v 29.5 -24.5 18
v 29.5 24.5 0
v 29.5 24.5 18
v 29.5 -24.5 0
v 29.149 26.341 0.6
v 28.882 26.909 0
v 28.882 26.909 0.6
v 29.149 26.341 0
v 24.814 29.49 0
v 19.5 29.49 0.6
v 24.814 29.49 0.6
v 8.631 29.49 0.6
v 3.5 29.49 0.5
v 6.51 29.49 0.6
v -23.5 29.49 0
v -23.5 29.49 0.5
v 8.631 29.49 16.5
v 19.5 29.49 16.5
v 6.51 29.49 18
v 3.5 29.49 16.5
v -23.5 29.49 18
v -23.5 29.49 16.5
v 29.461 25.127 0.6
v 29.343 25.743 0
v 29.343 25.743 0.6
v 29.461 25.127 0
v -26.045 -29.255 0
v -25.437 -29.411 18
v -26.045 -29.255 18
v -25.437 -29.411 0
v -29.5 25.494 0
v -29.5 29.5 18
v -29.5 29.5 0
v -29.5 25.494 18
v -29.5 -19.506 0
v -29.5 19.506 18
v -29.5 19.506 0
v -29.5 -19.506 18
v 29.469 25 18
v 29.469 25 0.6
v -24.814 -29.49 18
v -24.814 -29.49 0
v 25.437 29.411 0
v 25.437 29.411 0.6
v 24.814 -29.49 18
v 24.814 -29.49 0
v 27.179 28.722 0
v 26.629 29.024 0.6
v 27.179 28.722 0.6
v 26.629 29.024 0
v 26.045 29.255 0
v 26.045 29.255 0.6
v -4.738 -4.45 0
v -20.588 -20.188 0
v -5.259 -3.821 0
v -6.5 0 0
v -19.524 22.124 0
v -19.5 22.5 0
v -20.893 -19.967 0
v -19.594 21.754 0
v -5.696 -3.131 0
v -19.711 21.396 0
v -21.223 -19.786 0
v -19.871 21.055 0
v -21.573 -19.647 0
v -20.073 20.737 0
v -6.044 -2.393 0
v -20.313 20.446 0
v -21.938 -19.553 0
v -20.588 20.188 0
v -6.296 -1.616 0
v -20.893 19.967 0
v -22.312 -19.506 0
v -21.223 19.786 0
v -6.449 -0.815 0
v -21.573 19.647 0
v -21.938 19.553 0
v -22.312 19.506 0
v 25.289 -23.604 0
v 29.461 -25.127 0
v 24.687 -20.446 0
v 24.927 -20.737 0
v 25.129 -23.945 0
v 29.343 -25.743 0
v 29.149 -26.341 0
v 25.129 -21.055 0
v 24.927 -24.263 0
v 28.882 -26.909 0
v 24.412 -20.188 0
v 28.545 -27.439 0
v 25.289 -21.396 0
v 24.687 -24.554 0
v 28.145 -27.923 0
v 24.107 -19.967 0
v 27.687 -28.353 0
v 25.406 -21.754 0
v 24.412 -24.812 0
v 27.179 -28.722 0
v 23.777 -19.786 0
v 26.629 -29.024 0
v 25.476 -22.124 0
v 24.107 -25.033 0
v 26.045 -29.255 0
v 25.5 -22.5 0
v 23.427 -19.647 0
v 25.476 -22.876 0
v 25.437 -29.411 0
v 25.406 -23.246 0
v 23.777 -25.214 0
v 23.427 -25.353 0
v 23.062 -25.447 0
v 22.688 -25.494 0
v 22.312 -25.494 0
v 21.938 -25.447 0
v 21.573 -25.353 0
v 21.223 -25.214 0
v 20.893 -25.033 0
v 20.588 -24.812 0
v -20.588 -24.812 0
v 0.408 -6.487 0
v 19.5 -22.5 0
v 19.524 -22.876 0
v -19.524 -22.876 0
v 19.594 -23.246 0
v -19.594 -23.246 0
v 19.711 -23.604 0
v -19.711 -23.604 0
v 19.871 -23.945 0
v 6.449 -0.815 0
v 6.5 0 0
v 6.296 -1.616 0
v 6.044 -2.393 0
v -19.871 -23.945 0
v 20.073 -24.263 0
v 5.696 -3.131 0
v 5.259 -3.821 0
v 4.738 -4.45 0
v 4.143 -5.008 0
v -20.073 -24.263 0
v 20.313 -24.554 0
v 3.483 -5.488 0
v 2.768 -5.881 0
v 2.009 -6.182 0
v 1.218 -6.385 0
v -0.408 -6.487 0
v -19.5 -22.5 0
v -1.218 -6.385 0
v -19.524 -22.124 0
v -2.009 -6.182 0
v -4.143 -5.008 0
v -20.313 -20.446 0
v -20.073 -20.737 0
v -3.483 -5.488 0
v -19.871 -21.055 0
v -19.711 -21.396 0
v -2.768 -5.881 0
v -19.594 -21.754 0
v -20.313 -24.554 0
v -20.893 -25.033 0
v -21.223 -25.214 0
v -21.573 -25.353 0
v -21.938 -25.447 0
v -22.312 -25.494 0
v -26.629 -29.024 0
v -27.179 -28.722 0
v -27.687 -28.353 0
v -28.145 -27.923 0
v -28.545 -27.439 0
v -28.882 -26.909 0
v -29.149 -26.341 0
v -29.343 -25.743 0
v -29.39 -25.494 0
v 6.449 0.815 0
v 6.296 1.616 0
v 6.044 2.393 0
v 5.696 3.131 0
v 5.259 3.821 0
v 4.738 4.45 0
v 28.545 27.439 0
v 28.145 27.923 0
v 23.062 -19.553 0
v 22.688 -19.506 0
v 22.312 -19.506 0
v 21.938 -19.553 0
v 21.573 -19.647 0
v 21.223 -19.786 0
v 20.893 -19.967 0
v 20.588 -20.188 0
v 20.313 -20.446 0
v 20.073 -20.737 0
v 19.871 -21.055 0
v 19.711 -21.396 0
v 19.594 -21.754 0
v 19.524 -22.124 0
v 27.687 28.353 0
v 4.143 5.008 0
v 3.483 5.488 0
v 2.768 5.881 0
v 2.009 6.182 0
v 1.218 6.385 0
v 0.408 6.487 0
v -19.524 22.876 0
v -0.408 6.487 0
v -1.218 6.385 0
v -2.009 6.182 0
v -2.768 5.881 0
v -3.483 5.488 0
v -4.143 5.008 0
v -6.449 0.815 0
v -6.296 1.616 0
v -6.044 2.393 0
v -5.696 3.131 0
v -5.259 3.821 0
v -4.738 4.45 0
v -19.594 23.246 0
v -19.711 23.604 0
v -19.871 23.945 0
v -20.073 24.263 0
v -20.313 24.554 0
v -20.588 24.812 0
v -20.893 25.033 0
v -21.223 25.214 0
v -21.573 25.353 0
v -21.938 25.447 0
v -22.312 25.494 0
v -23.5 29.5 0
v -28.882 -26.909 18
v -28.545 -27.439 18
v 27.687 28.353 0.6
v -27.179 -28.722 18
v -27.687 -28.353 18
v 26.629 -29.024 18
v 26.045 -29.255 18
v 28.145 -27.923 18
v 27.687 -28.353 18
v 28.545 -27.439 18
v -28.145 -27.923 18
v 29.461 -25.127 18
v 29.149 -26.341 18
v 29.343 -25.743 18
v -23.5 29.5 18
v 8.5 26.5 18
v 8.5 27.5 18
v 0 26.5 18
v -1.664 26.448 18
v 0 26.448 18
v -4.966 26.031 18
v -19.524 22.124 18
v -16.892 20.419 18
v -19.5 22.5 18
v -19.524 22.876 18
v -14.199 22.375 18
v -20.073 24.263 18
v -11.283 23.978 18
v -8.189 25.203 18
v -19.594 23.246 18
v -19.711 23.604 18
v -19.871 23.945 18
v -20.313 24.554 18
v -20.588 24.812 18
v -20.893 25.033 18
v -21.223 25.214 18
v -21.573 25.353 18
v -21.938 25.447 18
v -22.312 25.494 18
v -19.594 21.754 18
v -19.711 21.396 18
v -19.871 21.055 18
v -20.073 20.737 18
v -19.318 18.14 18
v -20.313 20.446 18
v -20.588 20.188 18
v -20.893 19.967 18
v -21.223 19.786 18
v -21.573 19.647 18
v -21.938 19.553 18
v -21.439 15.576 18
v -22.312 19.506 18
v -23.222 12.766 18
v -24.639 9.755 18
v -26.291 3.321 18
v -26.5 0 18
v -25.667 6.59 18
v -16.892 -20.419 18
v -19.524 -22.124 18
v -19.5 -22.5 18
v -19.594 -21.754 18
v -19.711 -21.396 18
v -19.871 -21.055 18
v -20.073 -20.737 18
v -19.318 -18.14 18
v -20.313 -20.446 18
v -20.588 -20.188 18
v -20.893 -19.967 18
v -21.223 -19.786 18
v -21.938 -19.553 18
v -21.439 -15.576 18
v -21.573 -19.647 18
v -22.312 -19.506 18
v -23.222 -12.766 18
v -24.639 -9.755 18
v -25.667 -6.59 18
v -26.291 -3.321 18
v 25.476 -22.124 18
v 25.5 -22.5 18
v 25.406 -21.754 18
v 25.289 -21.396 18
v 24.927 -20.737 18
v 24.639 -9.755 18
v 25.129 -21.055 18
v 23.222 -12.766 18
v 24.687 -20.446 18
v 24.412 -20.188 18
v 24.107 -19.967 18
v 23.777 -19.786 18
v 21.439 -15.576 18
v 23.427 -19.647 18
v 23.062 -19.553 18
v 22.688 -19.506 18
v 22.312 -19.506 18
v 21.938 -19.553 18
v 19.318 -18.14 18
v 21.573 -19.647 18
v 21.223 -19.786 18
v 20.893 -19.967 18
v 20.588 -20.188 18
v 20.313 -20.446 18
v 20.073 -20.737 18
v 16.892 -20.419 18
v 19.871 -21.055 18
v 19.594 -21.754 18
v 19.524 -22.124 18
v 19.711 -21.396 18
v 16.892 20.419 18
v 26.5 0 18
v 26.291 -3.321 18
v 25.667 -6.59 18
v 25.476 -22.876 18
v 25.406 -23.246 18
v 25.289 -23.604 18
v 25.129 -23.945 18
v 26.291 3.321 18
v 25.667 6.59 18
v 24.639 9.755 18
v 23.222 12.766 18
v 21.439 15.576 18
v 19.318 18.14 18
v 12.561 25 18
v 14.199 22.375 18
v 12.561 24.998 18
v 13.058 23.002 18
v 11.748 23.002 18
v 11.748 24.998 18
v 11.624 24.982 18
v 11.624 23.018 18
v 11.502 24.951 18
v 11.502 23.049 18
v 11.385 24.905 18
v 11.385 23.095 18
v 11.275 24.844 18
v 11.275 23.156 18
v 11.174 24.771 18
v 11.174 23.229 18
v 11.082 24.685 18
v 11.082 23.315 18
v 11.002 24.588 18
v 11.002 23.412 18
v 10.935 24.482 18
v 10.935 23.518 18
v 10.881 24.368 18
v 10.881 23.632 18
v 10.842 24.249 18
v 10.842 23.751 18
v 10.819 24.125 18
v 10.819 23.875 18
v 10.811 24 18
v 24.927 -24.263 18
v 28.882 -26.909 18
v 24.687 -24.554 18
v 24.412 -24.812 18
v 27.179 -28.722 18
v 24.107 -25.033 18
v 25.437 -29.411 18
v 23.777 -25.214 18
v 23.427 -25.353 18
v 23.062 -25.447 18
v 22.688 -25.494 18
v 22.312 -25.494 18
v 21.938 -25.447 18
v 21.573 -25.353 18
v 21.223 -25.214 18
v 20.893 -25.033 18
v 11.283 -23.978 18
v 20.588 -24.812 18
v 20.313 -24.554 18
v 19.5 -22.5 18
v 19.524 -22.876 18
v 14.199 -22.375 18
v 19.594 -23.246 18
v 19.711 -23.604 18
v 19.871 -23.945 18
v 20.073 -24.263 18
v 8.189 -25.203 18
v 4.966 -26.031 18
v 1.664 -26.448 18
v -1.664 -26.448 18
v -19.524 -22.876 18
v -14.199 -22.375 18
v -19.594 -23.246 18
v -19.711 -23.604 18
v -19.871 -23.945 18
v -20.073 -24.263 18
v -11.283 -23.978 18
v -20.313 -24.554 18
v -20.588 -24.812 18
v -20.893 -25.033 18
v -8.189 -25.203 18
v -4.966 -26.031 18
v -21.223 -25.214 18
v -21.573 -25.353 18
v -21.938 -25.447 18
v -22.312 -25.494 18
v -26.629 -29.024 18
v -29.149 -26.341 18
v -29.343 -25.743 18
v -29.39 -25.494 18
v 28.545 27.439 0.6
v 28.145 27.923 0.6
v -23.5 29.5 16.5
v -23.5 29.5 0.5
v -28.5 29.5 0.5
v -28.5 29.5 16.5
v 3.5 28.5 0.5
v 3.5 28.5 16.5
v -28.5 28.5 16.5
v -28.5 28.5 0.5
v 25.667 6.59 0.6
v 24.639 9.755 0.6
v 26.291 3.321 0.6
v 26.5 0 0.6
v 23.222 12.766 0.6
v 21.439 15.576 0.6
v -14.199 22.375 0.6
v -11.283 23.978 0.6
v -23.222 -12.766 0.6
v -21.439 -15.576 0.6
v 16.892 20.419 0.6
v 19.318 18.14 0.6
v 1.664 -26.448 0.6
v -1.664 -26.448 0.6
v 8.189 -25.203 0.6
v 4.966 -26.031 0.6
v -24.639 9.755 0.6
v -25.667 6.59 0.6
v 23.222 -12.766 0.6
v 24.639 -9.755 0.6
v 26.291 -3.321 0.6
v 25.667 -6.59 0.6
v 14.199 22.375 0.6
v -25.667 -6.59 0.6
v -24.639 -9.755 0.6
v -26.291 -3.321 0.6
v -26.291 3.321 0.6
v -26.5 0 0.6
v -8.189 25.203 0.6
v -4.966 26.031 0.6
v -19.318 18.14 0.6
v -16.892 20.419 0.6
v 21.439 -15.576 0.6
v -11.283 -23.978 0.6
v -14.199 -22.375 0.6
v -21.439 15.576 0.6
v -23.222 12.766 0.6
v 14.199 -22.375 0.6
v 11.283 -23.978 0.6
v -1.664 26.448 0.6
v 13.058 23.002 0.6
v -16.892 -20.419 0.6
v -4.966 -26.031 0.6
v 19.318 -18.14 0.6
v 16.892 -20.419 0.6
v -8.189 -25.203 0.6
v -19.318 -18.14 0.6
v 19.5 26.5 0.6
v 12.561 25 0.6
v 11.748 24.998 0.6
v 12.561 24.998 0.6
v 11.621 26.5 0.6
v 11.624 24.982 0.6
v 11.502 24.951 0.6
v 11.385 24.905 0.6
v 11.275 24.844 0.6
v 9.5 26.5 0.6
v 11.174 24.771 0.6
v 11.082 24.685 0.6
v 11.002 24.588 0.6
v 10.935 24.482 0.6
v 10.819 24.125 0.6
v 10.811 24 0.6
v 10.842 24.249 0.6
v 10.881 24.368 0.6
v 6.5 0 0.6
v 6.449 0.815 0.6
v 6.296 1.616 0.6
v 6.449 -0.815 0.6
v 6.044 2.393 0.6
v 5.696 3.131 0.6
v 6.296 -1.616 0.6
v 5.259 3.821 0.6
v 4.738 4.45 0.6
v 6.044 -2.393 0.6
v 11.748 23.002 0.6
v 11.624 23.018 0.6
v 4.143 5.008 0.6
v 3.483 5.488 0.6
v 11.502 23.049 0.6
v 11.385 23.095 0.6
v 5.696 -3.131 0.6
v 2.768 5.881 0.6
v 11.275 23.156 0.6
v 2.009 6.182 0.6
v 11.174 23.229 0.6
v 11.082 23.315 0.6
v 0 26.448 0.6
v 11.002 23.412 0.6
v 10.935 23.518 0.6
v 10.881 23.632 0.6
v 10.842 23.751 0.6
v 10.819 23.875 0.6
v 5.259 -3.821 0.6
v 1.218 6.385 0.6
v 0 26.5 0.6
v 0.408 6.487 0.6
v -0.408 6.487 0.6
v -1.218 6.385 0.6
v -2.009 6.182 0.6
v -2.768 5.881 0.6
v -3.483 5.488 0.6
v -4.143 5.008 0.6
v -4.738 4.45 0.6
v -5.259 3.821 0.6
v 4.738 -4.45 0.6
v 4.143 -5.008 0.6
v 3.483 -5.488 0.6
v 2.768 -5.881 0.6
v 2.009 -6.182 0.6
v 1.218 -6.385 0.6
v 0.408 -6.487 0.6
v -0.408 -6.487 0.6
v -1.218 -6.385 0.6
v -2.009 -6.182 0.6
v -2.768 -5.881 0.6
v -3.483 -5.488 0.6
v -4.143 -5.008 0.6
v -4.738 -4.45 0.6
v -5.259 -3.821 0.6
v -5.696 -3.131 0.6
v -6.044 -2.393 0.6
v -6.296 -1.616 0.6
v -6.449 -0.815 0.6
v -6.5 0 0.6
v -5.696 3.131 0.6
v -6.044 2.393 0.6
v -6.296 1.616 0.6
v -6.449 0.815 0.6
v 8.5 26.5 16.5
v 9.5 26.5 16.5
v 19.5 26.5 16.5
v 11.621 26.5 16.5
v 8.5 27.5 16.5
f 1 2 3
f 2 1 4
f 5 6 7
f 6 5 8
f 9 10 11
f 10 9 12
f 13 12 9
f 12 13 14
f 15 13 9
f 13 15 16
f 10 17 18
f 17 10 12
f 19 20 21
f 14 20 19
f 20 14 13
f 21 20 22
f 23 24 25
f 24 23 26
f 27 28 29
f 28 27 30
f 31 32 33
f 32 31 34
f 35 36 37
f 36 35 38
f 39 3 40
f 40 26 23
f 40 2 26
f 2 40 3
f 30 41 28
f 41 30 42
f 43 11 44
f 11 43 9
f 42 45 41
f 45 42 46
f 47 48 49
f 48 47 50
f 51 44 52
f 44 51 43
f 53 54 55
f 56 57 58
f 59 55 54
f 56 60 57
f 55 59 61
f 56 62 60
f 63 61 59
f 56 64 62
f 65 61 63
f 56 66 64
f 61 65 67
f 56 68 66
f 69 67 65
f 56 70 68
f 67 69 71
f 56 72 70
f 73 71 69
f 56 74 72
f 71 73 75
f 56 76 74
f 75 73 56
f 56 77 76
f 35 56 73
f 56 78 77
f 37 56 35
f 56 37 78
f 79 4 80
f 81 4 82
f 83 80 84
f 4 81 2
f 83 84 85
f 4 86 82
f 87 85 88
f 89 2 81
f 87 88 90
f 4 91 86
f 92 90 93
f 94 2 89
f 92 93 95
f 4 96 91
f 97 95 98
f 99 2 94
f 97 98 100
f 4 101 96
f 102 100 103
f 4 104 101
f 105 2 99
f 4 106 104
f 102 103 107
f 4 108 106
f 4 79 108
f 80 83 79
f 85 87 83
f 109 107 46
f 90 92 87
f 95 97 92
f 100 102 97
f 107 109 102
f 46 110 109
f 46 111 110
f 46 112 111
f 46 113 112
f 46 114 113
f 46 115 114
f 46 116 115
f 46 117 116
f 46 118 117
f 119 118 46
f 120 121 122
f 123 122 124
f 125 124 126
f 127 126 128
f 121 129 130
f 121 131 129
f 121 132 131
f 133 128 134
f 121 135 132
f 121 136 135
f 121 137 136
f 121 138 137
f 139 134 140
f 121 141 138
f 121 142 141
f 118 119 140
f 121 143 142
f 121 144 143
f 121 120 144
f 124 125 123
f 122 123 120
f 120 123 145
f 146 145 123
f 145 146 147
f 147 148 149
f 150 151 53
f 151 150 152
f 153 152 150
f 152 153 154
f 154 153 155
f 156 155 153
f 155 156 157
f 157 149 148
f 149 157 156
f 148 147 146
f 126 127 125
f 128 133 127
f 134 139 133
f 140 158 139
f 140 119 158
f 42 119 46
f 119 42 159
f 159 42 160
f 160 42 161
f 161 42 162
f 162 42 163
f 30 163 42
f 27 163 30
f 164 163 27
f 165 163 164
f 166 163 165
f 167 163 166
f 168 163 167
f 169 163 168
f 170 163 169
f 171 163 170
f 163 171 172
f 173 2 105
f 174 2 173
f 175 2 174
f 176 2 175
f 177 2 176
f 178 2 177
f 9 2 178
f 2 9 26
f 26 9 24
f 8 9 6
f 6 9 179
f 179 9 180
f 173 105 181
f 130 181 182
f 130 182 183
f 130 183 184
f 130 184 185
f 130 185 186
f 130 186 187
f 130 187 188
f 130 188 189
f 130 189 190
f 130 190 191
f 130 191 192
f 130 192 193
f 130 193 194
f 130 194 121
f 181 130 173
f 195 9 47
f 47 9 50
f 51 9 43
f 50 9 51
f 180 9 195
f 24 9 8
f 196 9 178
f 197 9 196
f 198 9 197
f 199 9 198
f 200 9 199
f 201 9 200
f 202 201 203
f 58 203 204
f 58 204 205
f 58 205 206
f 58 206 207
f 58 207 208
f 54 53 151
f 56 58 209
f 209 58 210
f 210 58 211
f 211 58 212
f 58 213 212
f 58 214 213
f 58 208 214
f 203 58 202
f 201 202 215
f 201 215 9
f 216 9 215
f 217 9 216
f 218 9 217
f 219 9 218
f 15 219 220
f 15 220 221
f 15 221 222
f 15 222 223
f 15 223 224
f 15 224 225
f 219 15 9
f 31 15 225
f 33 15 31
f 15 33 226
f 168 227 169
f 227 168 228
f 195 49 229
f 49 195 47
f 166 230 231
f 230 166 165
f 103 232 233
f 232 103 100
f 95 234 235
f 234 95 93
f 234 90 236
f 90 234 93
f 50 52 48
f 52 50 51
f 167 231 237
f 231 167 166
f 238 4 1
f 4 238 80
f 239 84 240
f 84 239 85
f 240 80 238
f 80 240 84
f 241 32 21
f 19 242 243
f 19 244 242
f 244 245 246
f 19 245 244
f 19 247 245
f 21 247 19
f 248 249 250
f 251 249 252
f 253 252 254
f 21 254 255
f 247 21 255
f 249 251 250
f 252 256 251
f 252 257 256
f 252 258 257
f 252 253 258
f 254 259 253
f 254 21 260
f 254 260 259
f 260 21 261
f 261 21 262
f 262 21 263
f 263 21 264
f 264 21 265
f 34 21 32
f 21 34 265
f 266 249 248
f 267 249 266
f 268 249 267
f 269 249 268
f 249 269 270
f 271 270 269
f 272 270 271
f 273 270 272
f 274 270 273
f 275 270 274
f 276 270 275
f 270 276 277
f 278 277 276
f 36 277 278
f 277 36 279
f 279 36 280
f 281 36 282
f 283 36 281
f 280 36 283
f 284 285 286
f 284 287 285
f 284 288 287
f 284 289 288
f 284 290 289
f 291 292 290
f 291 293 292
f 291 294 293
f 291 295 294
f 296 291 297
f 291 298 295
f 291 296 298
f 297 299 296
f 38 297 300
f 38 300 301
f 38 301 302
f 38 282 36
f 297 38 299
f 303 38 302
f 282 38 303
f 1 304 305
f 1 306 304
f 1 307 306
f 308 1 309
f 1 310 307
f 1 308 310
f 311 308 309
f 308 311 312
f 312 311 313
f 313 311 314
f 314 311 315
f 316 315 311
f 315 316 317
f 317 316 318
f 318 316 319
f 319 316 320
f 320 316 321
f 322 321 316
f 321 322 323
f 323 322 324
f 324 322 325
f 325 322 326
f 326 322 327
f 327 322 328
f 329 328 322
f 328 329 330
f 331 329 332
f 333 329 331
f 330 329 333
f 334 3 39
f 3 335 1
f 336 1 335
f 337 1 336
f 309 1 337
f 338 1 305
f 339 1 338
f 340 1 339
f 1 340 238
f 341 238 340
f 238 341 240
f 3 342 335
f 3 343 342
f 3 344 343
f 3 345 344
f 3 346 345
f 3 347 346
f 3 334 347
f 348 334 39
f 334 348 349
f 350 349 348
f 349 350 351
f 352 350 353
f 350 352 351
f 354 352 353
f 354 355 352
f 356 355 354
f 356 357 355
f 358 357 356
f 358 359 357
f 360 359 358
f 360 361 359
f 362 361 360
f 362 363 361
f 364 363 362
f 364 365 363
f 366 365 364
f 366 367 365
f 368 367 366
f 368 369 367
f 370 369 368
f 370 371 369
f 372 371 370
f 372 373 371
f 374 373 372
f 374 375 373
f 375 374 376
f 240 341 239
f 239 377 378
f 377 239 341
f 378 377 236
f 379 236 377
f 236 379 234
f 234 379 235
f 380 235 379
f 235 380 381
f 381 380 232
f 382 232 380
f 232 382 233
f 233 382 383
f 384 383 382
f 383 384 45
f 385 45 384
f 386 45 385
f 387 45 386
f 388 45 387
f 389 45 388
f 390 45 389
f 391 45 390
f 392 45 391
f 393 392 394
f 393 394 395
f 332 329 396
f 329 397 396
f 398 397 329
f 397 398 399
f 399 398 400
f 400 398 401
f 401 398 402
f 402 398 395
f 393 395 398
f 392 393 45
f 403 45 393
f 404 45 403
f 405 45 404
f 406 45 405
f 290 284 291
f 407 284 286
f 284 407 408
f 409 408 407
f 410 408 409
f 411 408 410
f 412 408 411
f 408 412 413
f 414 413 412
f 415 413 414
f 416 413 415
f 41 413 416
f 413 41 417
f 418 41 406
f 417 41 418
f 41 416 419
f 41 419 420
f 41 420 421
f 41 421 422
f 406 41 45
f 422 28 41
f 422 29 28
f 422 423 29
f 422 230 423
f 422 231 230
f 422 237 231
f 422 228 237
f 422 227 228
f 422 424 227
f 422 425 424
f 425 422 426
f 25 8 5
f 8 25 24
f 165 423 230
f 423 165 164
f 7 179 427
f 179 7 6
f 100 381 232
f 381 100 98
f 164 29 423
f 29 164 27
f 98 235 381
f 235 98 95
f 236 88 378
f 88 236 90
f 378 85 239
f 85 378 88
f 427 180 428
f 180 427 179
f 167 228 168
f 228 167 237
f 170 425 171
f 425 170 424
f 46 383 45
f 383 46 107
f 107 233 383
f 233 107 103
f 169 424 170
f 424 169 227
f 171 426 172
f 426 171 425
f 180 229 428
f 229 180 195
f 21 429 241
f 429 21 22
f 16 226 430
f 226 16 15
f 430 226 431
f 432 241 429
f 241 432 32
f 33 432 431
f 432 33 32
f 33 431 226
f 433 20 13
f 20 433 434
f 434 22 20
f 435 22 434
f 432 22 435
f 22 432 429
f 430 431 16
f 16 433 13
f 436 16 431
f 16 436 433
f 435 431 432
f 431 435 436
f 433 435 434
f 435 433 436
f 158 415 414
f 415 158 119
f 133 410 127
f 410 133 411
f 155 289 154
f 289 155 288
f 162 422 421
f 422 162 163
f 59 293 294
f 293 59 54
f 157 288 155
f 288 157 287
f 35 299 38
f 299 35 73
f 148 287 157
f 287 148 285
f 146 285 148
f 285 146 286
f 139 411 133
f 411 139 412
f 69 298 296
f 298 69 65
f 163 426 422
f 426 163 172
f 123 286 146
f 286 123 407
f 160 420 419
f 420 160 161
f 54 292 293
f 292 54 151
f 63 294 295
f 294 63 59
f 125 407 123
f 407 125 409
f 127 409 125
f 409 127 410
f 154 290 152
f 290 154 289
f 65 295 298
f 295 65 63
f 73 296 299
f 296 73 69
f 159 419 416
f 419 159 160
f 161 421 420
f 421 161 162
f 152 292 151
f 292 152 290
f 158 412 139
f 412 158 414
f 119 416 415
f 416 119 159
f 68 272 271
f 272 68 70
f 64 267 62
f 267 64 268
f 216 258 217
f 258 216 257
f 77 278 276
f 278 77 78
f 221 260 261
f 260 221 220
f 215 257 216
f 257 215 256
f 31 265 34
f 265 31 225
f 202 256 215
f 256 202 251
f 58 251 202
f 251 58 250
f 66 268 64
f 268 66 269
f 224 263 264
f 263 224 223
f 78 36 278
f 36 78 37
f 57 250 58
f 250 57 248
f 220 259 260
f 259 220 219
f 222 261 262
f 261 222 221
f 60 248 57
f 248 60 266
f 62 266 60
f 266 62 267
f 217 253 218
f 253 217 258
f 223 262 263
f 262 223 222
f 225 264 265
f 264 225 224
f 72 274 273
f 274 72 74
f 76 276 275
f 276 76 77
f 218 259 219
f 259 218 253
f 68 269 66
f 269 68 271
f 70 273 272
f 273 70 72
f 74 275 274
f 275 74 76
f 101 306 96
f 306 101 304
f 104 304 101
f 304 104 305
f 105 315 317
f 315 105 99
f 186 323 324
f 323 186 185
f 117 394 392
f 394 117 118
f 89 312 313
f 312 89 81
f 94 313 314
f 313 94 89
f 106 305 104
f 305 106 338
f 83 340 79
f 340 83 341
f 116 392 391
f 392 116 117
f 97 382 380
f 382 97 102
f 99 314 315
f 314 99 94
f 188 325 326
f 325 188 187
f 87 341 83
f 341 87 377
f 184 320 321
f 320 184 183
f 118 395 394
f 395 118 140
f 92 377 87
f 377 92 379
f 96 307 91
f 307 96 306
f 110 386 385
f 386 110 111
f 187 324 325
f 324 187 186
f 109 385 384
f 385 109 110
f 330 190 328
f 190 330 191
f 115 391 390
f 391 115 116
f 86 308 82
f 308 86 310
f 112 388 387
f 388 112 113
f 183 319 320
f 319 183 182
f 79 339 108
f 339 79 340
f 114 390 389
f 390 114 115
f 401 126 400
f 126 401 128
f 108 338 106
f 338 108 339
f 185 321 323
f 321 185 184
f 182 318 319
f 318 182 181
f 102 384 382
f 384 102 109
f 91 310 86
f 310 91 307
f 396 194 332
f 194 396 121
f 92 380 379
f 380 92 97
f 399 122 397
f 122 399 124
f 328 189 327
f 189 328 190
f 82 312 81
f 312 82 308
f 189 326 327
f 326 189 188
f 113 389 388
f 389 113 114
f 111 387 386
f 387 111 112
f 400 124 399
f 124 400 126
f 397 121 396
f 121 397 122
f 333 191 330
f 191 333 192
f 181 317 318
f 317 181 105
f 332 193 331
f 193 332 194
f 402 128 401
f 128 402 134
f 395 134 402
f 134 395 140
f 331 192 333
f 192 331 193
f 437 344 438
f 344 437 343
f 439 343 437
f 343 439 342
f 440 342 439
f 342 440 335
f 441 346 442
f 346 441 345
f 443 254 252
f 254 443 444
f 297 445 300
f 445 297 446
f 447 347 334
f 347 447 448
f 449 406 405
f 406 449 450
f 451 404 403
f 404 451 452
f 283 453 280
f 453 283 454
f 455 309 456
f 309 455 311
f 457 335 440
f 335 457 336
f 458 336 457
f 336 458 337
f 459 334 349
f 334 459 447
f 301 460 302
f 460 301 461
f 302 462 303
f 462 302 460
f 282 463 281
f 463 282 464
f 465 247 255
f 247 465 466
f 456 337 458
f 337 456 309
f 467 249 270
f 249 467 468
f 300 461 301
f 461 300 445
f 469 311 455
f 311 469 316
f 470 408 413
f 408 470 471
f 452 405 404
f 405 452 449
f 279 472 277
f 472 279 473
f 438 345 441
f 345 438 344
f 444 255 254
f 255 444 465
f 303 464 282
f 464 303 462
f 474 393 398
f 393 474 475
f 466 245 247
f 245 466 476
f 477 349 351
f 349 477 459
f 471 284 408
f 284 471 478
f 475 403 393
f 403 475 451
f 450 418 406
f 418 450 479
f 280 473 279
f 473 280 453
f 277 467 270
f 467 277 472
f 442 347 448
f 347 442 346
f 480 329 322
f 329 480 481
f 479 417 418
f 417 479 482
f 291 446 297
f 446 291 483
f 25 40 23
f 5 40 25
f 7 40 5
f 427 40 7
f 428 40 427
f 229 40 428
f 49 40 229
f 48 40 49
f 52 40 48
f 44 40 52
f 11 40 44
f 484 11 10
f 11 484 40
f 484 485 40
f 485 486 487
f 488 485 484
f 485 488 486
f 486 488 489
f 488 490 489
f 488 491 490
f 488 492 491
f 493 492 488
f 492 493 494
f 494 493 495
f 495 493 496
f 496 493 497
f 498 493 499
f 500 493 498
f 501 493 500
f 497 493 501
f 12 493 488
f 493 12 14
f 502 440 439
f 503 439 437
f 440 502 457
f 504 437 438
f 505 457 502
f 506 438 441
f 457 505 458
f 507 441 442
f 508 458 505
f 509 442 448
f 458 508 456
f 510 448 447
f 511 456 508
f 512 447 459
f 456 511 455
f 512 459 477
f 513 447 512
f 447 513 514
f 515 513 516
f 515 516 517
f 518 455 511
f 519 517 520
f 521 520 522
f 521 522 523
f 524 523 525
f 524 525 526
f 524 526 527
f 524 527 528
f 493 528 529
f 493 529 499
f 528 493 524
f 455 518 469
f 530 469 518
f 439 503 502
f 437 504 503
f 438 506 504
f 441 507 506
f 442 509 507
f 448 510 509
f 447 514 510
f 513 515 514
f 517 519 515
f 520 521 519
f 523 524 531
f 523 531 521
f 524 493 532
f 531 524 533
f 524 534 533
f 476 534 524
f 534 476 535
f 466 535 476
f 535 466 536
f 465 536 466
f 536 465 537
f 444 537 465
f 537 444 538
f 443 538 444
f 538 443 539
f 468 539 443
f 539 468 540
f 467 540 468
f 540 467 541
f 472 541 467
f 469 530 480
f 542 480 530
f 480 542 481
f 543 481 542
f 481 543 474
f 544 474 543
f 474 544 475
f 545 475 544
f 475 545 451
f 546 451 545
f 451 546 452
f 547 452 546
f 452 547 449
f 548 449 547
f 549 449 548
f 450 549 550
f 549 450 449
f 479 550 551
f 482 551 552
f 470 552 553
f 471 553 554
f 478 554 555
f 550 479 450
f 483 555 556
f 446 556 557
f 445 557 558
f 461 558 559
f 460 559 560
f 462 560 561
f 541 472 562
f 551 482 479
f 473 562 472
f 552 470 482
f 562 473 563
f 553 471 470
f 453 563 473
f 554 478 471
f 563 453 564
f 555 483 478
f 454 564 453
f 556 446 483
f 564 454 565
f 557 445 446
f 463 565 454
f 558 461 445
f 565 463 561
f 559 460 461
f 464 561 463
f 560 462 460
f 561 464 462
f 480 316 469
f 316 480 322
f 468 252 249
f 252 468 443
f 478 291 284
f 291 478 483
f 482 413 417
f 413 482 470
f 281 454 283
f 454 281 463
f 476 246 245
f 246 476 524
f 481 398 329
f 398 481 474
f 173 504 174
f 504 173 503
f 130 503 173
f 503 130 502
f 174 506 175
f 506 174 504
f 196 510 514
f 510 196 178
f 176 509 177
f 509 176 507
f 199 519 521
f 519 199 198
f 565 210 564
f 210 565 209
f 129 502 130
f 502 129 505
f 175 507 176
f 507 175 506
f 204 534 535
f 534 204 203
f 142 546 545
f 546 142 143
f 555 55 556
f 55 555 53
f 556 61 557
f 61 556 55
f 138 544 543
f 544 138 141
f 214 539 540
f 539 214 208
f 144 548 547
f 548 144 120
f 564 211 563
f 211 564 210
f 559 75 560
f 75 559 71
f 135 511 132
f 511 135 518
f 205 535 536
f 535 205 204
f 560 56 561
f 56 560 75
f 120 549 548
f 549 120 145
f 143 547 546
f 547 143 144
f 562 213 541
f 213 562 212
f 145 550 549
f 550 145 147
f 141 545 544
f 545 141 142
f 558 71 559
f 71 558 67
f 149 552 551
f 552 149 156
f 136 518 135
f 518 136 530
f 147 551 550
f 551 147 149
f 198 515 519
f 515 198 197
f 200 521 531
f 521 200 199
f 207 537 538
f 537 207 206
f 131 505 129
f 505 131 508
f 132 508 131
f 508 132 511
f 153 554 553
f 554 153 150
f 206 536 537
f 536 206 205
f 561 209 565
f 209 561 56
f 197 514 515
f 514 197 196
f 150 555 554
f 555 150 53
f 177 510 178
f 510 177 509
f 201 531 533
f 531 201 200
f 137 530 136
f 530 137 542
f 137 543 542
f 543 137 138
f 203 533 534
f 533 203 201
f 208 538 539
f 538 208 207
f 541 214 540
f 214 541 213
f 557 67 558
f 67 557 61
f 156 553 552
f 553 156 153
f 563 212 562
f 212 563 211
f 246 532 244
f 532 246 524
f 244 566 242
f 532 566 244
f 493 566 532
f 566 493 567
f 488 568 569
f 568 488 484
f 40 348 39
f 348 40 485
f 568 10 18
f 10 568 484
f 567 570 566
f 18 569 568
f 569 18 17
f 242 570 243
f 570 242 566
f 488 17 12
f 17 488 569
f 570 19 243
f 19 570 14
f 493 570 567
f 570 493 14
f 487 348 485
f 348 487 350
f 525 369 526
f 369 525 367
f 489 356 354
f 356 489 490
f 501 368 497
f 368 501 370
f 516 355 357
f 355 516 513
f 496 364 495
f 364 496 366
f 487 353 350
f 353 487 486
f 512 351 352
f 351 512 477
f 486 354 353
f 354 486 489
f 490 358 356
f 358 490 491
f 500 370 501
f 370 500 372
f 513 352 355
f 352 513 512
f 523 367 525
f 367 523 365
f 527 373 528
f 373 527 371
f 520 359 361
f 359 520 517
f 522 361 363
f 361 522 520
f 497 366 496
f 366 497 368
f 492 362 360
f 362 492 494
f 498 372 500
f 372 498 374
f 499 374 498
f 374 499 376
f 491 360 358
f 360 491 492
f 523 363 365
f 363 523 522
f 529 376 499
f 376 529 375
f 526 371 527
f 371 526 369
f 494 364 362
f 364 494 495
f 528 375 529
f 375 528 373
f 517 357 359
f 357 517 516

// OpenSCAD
$fn = 50;


union() {
	difference() {
		union() {
			translate(v = [0, 0, 0]) {
				rotate(a = [0, 0, 0]) {
					hull() {
						translate(v = [-24.5000000000, 24.5000000000, 0]) {
							rotate(a = [0, 0, 0]) {
								translate(v = [0, 0, 0]) {
									rotate(a = [0, 0, 0]) {
										cylinder(h = 18, r = 5);
									}
								}
							}
						}
						translate(v = [24.5000000000, 24.5000000000, 0]) {
							rotate(a = [0, 0, 0]) {
								translate(v = [0, 0, 0]) {
									rotate(a = [0, 0, 0]) {
										cylinder(h = 18, r = 5);
									}
								}
							}
						}
						translate(v = [-24.5000000000, -24.5000000000, 0]) {
							rotate(a = [0, 0, 0]) {
								translate(v = [0, 0, 0]) {
									rotate(a = [0, 0, 0]) {
										cylinder(h = 18, r = 5);
									}
								}
							}
						}
						translate(v = [24.5000000000, -24.5000000000, 0]) {
							rotate(a = [0, 0, 0]) {
								translate(v = [0, 0, 0]) {
									rotate(a = [0, 0, 0]) {
										cylinder(h = 18, r = 5);
									}
								}
							}
						}
					}
				}
			}
			translate(v = [-29.5000000000, 23.5000000000, 0]) {
				rotate(a = [0, 0, 0]) {
					cube(size = [6, 6, 18]);
				}
			}
		}
		union() {
			#translate(v = [-28.5000000000, 28.5000000000, 0.5000000000]) {
				rotate(a = [0, 0, 0]) {
					cube(size = [32, 1, 16]);
				}
			}
			translate(v = [-30.0000000000, -22.5000000000, -125]) {
				rotate(a = [0, 0, 0]) {
					hull() {
						translate(v = [7.5000000000, 0, 0]) {
							rotate(a = [0, 0, 0]) {
								translate(v = [0, 0, 0]) {
									rotate(a = [0, 0, 0]) {
										cylinder(h = 250, r = 3.0000000000);
									}
								}
							}
						}
						translate(v = [-7.5000000000, 0, 0]) {
							rotate(a = [0, 0, 0]) {
								translate(v = [0, 0, 0]) {
									rotate(a = [0, 0, 0]) {
										cylinder(h = 250, r = 3.0000000000);
									}
								}
							}
						}
					}
				}
			}
			translate(v = [-30.0000000000, 22.5000000000, -125]) {
				rotate(a = [0, 0, 0]) {
					hull() {
						translate(v = [7.5000000000, 0, 0]) {
							rotate(a = [0, 0, 0]) {
								translate(v = [0, 0, 0]) {
									rotate(a = [0, 0, 0]) {
										cylinder(h = 250, r = 3.0000000000);
									}
								}
							}
						}
						translate(v = [-7.5000000000, 0, 0]) {
							rotate(a = [0, 0, 0]) {
								translate(v = [0, 0, 0]) {
									rotate(a = [0, 0, 0]) {
										cylinder(h = 250, r = 3.0000000000);
									}
								}
							}
						}
					}
				}
			}
			translate(v = [22.5000000000, -22.5000000000, -125.0000000000]) {
				rotate(a = [0, 0, 0]) {
					cylinder(h = 250, r = 3.0000000000);
				}
			}
			translate(v = [0, 0, 0.6000000000]) {
				rotate(a = [0, 0, 0]) {
					cylinder(h = 20.4000000000, r = 26.5000000000);
				}
			}
			translate(v = [0, 0, -9.0000000000]) {
				rotate(a = [0, 0, 0]) {
					cylinder(h = 18, r = 6.5000000000);
				}
			}
			translate(v = [0.0000000000, 25.0000000000, 0.6000000000]) {
				rotate(a = [0, 0, 0]) {
					cube(size = [29.5000000000, 1.5000000000, 20.4000000000]);
				}
			}
			translate(v = [19.5000000000, 25.0000000000, 0.6000000000]) {
				rotate(a = [0, 0, 0]) {
					cube(size = [10, 4.5000000000, 20.4000000000]);
				}
			}
			translate(v = [8.5000000000, 25.0000000000, 16.5000000000]) {
				rotate(a = [0, 0, 0]) {
					cube(size = [21, 4.5000000000, 1.5000000000]);
				}
			}
			translate(v = [5.7500000000, 30.2500000000, 0.6000000000]) {
				rotate(a = [0, 0, -45]) {
					cube(size = [7.5000000000, 1.5000000000, 20.4000000000]);
				}
			}
			translate(v = [5.0610000000, 23.0000000000, 0.6000000000]) {
				rotate(a = [0, 0, 0]) {
					cube(size = [7.5000000000, 2, 17.4000000000]);
				}
			}
		}
	}
	union() {
		translate(v = [14.3110000000, 24.0000000000, 0]) {
			rotate(a = [0, 0, 0]) {
				hull() {
					translate(v = [2.5000000000, 0, 0]) {
						rotate(a = [0, 0, 0]) {
							#translate(v = [0, 0, 0]) {
								rotate(a = [0, 0, 0]) {
									cylinder(h = 18, r = 1.0000000000);
								}
							}
						}
					}
					translate(v = [-2.5000000000, 0, 0]) {
						rotate(a = [0, 0, 0]) {
							#translate(v = [0, 0, 0]) {
								rotate(a = [0, 0, 0]) {
									cylinder(h = 18, r = 1.0000000000);
								}
							}
						}
					}
				}
			}
		}
	}
}
